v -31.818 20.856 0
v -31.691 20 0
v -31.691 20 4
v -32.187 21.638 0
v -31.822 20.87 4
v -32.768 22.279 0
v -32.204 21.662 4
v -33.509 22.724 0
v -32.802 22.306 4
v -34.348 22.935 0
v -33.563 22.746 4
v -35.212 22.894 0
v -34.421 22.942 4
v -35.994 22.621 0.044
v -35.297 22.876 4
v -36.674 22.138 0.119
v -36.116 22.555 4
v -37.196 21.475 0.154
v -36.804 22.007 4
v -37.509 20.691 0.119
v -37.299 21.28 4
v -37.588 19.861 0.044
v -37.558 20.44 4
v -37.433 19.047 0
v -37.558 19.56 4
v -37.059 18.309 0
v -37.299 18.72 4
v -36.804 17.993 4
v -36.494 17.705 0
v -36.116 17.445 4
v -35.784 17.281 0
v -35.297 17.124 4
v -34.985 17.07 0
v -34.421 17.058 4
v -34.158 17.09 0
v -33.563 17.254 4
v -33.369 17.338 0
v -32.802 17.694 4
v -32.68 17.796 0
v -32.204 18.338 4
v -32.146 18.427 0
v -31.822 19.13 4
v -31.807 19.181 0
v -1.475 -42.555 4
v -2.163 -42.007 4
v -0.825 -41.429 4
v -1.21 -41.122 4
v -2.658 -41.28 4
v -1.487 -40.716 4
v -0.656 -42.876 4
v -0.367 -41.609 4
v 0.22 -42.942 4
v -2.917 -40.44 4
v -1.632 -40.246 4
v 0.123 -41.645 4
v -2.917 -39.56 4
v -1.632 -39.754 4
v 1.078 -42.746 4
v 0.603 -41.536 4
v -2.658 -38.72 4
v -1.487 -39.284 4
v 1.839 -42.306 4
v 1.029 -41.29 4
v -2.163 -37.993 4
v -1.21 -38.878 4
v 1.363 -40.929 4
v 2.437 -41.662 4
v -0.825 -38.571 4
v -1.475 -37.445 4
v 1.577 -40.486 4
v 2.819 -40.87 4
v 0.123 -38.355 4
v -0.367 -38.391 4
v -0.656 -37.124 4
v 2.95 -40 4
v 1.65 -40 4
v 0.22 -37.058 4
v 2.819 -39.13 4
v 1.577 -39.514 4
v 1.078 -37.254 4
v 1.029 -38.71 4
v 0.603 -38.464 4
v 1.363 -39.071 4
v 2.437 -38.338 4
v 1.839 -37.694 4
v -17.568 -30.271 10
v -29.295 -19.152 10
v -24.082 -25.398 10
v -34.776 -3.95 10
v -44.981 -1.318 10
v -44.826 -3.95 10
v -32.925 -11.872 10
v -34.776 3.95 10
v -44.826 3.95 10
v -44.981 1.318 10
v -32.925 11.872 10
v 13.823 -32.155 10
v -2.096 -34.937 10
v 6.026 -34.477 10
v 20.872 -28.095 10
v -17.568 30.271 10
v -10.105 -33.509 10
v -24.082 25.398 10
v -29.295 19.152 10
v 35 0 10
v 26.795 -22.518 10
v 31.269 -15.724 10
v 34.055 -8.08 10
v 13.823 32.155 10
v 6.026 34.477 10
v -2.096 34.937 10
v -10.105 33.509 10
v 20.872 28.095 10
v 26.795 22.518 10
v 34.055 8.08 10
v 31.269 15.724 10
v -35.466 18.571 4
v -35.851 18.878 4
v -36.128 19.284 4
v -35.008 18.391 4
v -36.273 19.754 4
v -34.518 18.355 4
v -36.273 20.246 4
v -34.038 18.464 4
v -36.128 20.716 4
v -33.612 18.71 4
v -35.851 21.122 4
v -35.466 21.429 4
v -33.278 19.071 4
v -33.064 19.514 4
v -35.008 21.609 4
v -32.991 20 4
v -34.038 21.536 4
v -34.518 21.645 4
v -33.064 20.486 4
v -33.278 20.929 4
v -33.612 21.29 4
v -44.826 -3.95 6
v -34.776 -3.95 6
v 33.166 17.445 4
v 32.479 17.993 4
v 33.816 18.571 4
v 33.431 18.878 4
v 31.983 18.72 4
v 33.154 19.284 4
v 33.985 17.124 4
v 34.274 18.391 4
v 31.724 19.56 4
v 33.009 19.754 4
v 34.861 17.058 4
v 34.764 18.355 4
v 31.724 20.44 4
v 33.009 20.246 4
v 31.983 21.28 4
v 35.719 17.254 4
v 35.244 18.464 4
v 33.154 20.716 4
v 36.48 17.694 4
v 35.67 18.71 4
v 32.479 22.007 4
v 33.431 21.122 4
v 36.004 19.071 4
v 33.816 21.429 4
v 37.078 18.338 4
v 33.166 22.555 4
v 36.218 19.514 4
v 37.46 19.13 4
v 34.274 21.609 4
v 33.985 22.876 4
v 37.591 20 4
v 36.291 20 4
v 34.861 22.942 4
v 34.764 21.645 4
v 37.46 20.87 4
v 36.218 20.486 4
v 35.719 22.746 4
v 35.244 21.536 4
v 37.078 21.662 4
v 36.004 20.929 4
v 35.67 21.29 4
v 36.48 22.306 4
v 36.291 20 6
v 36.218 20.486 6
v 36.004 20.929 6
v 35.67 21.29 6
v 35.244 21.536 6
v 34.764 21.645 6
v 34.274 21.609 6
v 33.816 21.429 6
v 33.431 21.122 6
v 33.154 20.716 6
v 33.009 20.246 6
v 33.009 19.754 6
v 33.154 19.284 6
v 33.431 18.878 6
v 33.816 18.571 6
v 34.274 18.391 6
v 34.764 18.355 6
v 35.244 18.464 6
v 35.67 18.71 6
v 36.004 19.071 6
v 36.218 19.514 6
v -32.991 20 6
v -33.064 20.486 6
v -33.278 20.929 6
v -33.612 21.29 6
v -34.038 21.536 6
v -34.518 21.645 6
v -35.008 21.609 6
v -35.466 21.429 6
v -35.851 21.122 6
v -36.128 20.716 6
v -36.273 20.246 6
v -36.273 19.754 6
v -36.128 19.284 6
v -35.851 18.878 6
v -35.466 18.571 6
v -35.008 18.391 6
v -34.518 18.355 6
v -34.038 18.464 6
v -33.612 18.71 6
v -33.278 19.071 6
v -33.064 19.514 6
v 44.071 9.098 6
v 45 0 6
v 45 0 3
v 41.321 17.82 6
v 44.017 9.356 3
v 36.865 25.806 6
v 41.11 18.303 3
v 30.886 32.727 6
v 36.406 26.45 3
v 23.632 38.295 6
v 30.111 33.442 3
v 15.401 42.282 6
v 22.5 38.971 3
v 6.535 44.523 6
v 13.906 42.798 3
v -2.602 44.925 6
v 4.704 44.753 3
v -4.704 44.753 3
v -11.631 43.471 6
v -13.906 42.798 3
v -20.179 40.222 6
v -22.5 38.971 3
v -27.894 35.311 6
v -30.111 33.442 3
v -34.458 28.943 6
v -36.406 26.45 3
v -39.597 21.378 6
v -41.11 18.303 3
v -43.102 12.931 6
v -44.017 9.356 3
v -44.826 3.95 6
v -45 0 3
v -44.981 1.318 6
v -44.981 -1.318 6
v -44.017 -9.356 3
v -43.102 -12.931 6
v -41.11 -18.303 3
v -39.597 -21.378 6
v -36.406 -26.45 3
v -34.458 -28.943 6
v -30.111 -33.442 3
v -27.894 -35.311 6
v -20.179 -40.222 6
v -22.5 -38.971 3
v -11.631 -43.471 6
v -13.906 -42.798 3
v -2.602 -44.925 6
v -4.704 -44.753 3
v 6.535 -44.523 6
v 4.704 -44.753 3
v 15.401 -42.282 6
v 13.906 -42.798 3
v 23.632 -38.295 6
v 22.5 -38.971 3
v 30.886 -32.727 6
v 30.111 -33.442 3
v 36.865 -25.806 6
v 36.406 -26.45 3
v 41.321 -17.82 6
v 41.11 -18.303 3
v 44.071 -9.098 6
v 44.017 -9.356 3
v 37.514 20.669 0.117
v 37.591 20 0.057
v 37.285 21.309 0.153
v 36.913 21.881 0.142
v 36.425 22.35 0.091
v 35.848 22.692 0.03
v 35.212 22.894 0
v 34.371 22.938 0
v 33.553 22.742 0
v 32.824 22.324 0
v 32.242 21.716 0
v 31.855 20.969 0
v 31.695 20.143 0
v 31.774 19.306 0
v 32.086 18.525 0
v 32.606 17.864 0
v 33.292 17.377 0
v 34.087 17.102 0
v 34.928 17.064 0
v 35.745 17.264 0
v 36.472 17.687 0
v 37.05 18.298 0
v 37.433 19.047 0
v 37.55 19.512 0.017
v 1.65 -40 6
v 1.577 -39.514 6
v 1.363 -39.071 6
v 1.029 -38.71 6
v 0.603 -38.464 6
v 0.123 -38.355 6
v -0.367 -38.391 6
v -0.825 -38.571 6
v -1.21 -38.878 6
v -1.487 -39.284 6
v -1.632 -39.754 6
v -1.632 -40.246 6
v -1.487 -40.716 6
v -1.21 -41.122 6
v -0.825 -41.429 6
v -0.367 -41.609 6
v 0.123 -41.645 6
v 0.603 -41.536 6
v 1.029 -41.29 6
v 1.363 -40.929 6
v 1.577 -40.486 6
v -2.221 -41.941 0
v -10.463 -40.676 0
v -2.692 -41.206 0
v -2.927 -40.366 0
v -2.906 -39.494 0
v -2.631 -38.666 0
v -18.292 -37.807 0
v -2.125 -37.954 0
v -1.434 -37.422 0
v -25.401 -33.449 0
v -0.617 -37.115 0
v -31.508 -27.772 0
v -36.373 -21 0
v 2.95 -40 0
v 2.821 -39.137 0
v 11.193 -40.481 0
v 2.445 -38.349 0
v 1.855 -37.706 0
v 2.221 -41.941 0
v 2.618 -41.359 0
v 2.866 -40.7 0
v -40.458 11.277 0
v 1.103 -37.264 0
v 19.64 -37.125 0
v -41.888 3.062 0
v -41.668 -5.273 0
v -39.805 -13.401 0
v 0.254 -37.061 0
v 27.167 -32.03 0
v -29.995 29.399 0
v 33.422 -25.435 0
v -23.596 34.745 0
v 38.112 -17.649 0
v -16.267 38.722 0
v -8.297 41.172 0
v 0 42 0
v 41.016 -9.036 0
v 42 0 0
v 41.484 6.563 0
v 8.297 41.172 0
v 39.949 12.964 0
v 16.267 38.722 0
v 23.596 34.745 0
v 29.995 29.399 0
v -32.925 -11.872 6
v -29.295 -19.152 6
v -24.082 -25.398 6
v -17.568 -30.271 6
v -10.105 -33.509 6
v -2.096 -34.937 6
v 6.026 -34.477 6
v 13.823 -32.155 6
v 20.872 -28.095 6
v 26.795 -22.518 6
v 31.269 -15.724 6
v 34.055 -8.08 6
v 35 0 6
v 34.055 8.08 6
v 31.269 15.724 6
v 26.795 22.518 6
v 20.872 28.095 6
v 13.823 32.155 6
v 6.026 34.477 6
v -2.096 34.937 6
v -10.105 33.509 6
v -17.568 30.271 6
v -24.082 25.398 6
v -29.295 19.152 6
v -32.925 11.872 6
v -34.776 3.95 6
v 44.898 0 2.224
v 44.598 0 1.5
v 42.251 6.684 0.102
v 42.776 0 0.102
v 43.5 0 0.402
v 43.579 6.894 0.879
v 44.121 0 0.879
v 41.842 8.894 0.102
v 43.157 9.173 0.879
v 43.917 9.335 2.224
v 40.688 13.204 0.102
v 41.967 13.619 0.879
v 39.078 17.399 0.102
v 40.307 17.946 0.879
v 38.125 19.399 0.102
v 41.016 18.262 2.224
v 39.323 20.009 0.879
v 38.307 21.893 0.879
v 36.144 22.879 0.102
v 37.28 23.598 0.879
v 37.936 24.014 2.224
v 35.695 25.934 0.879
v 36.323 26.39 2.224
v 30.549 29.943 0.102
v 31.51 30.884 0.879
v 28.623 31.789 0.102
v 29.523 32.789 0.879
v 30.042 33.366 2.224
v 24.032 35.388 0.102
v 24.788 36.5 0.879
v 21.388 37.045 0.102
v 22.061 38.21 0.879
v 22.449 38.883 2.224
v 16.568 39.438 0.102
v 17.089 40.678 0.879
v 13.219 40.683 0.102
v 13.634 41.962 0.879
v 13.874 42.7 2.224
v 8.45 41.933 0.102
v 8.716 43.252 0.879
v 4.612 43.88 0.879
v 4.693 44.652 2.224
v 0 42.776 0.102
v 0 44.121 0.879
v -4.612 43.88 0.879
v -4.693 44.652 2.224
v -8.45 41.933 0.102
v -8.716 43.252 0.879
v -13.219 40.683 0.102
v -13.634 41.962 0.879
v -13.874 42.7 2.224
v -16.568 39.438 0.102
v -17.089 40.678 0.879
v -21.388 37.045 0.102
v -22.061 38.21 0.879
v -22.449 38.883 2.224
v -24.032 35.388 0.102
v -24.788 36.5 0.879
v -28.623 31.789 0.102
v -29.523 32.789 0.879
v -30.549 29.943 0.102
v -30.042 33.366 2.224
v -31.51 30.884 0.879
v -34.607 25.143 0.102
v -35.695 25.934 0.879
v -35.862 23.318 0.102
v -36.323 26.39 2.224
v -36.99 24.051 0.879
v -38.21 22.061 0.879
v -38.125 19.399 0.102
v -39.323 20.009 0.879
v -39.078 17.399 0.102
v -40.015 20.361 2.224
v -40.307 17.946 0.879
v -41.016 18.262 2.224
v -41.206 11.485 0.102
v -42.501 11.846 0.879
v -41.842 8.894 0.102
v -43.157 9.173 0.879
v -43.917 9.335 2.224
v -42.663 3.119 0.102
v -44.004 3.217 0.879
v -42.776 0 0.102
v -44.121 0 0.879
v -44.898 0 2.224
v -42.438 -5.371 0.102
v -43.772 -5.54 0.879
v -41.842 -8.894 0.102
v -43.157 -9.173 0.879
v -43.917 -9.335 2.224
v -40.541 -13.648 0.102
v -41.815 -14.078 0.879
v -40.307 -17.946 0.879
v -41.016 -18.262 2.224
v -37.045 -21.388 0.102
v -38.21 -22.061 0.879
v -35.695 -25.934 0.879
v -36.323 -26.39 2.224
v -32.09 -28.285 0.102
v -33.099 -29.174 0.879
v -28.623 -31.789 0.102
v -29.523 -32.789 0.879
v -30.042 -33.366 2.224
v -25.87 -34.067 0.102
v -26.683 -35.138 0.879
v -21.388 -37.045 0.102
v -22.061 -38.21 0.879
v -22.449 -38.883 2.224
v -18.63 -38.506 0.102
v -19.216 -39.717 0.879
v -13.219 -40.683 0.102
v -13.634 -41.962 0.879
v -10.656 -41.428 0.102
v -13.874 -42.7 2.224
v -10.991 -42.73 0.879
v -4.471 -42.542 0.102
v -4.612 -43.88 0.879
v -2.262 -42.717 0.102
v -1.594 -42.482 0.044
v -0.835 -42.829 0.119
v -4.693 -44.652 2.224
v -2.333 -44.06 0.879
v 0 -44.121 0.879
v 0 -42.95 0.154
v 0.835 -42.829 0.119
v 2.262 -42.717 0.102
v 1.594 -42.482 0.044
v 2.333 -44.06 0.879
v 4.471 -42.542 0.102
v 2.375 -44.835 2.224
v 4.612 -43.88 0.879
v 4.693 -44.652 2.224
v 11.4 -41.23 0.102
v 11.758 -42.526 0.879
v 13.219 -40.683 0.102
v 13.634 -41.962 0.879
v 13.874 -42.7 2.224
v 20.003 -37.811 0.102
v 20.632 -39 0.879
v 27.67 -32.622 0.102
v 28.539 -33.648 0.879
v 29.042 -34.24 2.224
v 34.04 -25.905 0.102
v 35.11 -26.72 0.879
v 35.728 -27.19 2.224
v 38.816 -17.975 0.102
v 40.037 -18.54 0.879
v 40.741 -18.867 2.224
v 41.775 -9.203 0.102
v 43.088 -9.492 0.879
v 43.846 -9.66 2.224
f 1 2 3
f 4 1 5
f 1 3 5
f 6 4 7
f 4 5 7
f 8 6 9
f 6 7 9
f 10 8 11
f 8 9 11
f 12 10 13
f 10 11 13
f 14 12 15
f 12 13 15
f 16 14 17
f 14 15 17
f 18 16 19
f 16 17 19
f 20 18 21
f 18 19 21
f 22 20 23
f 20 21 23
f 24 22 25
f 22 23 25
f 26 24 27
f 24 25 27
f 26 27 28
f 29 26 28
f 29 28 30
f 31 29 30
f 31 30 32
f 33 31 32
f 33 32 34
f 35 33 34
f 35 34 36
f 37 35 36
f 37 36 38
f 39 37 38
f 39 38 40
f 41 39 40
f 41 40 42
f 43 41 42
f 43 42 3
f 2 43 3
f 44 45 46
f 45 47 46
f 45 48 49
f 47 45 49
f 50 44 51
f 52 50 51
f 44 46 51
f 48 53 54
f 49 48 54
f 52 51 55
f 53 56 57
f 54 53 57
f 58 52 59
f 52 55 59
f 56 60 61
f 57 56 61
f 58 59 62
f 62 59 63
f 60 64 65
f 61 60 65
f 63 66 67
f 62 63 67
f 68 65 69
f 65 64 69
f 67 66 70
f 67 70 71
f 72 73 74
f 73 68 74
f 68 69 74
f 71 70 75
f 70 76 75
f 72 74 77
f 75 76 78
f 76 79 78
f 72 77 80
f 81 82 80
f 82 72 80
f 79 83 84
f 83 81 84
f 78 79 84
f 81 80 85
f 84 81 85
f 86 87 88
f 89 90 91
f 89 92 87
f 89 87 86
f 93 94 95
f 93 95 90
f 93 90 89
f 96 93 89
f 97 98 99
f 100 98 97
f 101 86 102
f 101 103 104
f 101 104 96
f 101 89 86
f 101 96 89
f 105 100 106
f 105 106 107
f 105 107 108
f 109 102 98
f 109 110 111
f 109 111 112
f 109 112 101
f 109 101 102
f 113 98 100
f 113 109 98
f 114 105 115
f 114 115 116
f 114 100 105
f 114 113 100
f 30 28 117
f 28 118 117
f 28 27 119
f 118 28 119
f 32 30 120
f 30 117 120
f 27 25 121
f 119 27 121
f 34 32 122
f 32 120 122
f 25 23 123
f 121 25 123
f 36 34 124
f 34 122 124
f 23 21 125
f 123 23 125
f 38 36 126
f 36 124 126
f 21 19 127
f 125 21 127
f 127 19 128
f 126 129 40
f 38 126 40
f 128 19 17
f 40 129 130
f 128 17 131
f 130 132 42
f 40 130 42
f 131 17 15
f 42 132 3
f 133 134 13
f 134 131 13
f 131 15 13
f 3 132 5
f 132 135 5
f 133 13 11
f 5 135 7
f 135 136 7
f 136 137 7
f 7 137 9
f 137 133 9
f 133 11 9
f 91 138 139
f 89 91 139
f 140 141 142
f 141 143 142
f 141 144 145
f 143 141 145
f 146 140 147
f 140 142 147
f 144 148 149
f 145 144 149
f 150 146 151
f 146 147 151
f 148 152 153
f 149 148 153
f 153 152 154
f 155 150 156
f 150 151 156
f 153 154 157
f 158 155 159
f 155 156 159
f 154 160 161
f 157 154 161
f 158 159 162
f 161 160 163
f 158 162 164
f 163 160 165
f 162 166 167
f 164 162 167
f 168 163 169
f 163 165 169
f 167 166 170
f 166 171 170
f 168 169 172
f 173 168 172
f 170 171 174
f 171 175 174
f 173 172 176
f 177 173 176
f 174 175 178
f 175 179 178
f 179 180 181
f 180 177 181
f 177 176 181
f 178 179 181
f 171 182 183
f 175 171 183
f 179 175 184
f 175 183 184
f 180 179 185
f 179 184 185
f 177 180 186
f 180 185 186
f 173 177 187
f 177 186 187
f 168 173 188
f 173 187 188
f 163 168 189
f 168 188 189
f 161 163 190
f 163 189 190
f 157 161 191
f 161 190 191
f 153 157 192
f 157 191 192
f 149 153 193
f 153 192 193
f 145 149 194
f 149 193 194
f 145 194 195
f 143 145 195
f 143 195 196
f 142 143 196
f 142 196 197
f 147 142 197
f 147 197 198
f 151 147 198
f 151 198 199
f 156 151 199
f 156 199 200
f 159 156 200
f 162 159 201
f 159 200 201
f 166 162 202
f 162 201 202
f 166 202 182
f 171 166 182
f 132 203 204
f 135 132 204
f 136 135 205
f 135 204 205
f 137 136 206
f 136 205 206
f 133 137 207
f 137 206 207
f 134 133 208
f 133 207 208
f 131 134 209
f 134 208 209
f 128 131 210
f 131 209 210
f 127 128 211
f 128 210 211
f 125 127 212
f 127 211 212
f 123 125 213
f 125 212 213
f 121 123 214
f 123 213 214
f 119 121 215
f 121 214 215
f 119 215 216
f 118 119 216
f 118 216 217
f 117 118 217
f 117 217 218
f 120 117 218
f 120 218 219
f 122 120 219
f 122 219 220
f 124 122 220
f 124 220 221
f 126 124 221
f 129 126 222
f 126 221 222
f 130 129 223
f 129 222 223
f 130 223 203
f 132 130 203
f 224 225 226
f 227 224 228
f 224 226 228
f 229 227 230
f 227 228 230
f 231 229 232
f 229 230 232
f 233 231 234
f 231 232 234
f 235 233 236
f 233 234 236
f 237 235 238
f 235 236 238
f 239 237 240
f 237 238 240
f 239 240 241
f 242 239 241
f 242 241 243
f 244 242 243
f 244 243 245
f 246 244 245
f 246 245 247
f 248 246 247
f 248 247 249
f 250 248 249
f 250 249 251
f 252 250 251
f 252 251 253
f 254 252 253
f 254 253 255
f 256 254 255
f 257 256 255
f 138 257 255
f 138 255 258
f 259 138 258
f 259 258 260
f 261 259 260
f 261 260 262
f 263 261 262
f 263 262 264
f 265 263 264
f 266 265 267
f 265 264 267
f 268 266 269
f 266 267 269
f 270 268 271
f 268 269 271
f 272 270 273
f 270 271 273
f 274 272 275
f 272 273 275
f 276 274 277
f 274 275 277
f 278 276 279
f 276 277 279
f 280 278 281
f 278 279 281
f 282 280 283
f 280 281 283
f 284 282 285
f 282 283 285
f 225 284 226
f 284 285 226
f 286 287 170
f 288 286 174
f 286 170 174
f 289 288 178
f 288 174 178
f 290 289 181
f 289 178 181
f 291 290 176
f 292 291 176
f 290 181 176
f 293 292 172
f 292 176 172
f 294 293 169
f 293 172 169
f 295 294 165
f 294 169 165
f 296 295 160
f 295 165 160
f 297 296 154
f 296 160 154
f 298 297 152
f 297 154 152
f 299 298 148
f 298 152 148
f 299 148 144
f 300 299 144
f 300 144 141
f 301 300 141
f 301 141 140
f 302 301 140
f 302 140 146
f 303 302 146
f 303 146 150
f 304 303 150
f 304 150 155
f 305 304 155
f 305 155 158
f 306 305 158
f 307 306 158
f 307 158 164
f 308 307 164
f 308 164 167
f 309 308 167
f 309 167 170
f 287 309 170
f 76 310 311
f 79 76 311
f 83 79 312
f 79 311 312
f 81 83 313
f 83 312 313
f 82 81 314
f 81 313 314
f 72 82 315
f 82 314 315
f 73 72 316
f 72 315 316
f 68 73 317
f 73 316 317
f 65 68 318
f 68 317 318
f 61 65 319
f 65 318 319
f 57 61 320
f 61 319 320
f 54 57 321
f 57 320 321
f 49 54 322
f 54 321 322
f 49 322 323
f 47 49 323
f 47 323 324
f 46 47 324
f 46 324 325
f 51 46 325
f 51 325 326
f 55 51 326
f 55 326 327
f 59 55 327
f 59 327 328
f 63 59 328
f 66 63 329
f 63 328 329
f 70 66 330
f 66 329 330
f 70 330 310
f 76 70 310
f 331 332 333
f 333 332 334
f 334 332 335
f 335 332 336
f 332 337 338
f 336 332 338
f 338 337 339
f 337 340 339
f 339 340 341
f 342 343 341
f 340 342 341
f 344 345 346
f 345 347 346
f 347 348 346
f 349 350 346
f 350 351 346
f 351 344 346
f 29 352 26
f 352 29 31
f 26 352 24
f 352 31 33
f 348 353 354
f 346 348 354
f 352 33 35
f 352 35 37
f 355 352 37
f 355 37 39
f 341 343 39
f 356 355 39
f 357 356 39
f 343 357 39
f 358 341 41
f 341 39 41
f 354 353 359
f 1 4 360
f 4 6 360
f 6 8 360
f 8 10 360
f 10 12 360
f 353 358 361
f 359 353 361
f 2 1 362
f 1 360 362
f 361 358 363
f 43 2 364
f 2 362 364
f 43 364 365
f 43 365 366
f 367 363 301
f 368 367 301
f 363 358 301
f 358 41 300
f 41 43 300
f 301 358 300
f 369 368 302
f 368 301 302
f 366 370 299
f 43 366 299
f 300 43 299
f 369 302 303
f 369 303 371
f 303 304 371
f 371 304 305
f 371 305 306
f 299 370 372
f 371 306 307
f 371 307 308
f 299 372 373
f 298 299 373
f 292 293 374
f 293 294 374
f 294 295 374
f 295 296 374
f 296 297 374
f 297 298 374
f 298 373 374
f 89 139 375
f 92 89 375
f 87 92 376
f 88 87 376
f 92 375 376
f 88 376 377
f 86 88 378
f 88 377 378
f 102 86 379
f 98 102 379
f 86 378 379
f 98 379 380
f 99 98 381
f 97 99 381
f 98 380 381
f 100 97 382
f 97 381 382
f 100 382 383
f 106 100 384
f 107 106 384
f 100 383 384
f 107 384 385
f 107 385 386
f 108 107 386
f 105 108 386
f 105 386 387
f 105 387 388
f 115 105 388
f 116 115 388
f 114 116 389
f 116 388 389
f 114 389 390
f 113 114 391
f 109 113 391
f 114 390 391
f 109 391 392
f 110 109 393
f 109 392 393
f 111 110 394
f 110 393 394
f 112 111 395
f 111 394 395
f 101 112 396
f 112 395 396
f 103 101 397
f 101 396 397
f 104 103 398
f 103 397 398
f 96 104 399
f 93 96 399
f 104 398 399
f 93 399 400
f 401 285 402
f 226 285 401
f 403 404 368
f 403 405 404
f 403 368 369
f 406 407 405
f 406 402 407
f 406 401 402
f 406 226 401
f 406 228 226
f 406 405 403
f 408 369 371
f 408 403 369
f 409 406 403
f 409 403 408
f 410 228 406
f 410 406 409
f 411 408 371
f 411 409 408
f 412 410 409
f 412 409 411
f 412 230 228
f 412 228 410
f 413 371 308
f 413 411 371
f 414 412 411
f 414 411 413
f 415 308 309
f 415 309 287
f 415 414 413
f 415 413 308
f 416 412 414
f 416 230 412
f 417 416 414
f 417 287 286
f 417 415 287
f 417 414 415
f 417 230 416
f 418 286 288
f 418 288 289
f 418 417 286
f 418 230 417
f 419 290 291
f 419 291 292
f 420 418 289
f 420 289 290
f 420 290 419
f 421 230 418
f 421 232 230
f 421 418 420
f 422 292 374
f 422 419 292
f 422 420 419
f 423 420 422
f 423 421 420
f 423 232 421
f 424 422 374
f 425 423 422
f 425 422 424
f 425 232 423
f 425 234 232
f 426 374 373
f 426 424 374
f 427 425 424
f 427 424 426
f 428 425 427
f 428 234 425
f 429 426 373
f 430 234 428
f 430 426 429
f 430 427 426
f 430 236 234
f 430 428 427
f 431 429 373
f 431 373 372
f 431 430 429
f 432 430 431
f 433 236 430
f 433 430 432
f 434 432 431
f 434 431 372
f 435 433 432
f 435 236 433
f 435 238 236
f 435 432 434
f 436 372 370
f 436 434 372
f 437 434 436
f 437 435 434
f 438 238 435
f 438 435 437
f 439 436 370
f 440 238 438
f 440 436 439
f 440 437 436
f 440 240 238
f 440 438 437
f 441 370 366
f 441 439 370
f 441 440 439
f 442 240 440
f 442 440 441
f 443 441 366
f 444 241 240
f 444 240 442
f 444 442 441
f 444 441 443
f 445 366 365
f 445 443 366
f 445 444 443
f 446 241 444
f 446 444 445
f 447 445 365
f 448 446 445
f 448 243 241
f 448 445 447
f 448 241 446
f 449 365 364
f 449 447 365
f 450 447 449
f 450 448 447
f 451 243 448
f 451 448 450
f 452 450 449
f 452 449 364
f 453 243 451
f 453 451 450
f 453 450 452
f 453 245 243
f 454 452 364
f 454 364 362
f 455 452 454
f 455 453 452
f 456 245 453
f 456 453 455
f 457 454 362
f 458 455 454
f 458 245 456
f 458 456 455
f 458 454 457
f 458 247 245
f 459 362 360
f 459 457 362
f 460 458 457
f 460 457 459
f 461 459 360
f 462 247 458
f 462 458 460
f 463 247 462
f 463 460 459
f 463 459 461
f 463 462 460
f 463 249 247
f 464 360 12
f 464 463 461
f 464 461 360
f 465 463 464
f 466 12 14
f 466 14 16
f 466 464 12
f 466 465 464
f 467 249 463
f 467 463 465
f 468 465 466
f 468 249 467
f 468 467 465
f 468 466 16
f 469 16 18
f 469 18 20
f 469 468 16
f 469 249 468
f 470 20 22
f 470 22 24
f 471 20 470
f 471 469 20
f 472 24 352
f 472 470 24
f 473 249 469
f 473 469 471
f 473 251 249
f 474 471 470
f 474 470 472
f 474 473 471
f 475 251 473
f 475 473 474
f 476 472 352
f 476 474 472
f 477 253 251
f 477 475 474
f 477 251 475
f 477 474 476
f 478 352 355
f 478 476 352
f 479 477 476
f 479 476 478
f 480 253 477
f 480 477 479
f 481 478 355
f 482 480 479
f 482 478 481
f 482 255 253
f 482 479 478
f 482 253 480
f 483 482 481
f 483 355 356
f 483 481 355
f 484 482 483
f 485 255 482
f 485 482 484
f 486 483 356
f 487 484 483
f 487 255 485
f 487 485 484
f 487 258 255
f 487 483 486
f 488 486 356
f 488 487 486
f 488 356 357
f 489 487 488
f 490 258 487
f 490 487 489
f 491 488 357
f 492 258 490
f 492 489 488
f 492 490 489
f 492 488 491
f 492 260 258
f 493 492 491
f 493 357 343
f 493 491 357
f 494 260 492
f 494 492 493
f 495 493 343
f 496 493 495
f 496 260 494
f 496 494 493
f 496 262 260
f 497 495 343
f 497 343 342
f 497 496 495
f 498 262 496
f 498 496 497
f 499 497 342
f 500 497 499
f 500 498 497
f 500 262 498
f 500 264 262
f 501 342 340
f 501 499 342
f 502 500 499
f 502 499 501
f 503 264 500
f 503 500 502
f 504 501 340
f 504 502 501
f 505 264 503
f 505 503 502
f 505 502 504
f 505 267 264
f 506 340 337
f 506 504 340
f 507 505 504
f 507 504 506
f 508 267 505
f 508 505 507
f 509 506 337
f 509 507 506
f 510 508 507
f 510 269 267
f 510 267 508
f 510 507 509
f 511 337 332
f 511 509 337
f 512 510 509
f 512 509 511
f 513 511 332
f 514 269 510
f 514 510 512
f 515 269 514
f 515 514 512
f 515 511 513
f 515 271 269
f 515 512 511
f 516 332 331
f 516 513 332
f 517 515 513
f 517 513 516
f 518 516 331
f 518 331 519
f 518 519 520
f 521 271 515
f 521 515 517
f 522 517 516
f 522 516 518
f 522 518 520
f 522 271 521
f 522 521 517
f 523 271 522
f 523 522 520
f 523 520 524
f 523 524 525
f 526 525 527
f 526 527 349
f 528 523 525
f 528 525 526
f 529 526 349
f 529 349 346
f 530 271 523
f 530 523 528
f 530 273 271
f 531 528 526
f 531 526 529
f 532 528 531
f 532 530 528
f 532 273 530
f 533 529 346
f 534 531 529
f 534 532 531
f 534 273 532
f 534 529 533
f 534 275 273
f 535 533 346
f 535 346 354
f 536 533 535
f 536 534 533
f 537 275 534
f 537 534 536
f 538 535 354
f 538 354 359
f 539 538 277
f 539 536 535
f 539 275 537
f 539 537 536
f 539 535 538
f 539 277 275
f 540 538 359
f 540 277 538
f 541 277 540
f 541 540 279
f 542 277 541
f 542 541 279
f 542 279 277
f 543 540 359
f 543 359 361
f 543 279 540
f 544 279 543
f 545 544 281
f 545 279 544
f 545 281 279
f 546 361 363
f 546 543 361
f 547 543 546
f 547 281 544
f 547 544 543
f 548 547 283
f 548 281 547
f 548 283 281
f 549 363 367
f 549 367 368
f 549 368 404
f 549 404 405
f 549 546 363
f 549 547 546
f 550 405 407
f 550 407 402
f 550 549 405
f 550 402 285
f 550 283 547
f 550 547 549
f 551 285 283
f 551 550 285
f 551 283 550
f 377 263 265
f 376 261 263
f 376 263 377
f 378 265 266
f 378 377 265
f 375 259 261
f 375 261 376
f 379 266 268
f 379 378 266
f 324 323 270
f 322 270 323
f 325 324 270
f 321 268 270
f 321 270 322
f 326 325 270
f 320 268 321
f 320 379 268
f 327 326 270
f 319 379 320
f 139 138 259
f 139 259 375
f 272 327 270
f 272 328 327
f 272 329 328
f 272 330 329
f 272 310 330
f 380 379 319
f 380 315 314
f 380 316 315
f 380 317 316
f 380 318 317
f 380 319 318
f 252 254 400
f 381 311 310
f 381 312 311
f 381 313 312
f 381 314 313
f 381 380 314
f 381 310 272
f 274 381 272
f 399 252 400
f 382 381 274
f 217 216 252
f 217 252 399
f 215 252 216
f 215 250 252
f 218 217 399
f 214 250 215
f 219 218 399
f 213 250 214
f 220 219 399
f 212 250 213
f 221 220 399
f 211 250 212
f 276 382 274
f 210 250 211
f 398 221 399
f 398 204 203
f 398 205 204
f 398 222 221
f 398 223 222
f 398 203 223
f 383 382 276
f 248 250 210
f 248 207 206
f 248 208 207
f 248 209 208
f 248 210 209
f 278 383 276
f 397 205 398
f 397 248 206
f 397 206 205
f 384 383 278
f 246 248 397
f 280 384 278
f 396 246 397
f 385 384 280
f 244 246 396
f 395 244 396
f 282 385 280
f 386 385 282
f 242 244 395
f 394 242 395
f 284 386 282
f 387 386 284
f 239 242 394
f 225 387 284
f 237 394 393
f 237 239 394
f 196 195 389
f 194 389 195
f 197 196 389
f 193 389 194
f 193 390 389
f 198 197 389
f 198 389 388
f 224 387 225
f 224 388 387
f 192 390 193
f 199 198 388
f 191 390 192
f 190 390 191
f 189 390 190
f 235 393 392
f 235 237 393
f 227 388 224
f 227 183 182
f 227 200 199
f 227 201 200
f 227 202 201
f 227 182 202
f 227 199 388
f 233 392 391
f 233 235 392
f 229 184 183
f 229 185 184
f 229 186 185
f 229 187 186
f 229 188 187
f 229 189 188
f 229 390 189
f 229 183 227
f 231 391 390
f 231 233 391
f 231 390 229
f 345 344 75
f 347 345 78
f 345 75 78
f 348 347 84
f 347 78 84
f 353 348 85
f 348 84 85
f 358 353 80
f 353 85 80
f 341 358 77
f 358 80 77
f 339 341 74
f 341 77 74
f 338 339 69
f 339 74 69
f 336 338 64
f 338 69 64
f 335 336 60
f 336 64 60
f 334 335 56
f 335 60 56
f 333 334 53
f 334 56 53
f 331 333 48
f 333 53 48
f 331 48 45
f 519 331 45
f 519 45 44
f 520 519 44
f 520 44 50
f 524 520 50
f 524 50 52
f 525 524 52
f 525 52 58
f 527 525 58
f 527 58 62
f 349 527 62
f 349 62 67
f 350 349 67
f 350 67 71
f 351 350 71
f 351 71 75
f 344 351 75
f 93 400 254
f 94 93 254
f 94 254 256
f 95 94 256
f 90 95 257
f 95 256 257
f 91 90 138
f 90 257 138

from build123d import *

# Parameters (mm, degrees)
ESBO_O1_R                = 45
RESSALTO_EXTRUS_O1_DEPTH = 6
RESSALTO_EXTRUS_O2_DEPTH = 4
ESBO_O4_R                = 1.65
CORTE_EXTRUS_O1_DEPTH    = 2
ESBO_O5_R                = 2.95
CORTE_EXTRUS_O2_DEPTH    = 4
FILETE1_R                = 3


with BuildPart() as part:
    # Esboço1 → Ressalto-extrusão1 (new body)
    with BuildSketch(Plane.XY):
        Circle(ESBO_O1_R)
    extrude(amount=RESSALTO_EXTRUS_O1_DEPTH)

    # Esboço3 → Ressalto-extrusão2 (add)
    with BuildSketch(Plane.XY.offset(6)):
        with BuildLine():
            Line((-34.776392855, 3.95), (-44.826303662, 3.95))
            ThreePointArc((-44.826303662, 3.95), (-45, 0), (-44.826303662, -3.95))
            Line((-44.826303662, -3.95), (-34.776392855, -3.95))
            ThreePointArc((-34.776392855, -3.95), (35, 0), (-34.776392855, 3.95))
        make_face()
    extrude(amount=RESSALTO_EXTRUS_O2_DEPTH)

    # Esboço4 → Corte-extrusão1 (cut)
    with BuildSketch(Plane.XY.offset(6)):
        with Locations((0, -40)):
            Circle(ESBO_O4_R)
        with Locations((-34.641016151, 20)):
            Circle(ESBO_O4_R)
        with Locations((34.641016151, 20)):
            Circle(ESBO_O4_R)
    extrude(amount=-CORTE_EXTRUS_O1_DEPTH, mode=Mode.SUBTRACT)

    # Esboço5 → Corte-extrusão2 (cut)
    with BuildSketch(Plane.XY.offset(4)):
        with Locations((0, -40)):
            Circle(ESBO_O5_R)
        with Locations((-34.641016151, 20)):
            Circle(ESBO_O5_R)
        with Locations((34.641016151, 20)):
            Circle(ESBO_O5_R)
    extrude(amount=-CORTE_EXTRUS_O2_DEPTH, mode=Mode.SUBTRACT)

    # Filete1
    # the kernel refuses this fillet: 3 mm, written as the material it takes off along each edge
    with BuildSketch(Plane(origin=(0, 0, 0), x_dir=(1, 0, 0), z_dir=(0, -1, 0))) as filete1_piece_1:
        with BuildLine():
            CenterArc((45 - FILETE1_R, FILETE1_R), FILETE1_R, 270, 90)
            Line((45 - FILETE1_R, 0), (45, 0))
            Line((45, 0), (45, FILETE1_R))
        make_face()
    revolve(axis=Axis((0, 0, 0), (0, 0, 1)), mode=Mode.SUBTRACT)


solid = part.part
